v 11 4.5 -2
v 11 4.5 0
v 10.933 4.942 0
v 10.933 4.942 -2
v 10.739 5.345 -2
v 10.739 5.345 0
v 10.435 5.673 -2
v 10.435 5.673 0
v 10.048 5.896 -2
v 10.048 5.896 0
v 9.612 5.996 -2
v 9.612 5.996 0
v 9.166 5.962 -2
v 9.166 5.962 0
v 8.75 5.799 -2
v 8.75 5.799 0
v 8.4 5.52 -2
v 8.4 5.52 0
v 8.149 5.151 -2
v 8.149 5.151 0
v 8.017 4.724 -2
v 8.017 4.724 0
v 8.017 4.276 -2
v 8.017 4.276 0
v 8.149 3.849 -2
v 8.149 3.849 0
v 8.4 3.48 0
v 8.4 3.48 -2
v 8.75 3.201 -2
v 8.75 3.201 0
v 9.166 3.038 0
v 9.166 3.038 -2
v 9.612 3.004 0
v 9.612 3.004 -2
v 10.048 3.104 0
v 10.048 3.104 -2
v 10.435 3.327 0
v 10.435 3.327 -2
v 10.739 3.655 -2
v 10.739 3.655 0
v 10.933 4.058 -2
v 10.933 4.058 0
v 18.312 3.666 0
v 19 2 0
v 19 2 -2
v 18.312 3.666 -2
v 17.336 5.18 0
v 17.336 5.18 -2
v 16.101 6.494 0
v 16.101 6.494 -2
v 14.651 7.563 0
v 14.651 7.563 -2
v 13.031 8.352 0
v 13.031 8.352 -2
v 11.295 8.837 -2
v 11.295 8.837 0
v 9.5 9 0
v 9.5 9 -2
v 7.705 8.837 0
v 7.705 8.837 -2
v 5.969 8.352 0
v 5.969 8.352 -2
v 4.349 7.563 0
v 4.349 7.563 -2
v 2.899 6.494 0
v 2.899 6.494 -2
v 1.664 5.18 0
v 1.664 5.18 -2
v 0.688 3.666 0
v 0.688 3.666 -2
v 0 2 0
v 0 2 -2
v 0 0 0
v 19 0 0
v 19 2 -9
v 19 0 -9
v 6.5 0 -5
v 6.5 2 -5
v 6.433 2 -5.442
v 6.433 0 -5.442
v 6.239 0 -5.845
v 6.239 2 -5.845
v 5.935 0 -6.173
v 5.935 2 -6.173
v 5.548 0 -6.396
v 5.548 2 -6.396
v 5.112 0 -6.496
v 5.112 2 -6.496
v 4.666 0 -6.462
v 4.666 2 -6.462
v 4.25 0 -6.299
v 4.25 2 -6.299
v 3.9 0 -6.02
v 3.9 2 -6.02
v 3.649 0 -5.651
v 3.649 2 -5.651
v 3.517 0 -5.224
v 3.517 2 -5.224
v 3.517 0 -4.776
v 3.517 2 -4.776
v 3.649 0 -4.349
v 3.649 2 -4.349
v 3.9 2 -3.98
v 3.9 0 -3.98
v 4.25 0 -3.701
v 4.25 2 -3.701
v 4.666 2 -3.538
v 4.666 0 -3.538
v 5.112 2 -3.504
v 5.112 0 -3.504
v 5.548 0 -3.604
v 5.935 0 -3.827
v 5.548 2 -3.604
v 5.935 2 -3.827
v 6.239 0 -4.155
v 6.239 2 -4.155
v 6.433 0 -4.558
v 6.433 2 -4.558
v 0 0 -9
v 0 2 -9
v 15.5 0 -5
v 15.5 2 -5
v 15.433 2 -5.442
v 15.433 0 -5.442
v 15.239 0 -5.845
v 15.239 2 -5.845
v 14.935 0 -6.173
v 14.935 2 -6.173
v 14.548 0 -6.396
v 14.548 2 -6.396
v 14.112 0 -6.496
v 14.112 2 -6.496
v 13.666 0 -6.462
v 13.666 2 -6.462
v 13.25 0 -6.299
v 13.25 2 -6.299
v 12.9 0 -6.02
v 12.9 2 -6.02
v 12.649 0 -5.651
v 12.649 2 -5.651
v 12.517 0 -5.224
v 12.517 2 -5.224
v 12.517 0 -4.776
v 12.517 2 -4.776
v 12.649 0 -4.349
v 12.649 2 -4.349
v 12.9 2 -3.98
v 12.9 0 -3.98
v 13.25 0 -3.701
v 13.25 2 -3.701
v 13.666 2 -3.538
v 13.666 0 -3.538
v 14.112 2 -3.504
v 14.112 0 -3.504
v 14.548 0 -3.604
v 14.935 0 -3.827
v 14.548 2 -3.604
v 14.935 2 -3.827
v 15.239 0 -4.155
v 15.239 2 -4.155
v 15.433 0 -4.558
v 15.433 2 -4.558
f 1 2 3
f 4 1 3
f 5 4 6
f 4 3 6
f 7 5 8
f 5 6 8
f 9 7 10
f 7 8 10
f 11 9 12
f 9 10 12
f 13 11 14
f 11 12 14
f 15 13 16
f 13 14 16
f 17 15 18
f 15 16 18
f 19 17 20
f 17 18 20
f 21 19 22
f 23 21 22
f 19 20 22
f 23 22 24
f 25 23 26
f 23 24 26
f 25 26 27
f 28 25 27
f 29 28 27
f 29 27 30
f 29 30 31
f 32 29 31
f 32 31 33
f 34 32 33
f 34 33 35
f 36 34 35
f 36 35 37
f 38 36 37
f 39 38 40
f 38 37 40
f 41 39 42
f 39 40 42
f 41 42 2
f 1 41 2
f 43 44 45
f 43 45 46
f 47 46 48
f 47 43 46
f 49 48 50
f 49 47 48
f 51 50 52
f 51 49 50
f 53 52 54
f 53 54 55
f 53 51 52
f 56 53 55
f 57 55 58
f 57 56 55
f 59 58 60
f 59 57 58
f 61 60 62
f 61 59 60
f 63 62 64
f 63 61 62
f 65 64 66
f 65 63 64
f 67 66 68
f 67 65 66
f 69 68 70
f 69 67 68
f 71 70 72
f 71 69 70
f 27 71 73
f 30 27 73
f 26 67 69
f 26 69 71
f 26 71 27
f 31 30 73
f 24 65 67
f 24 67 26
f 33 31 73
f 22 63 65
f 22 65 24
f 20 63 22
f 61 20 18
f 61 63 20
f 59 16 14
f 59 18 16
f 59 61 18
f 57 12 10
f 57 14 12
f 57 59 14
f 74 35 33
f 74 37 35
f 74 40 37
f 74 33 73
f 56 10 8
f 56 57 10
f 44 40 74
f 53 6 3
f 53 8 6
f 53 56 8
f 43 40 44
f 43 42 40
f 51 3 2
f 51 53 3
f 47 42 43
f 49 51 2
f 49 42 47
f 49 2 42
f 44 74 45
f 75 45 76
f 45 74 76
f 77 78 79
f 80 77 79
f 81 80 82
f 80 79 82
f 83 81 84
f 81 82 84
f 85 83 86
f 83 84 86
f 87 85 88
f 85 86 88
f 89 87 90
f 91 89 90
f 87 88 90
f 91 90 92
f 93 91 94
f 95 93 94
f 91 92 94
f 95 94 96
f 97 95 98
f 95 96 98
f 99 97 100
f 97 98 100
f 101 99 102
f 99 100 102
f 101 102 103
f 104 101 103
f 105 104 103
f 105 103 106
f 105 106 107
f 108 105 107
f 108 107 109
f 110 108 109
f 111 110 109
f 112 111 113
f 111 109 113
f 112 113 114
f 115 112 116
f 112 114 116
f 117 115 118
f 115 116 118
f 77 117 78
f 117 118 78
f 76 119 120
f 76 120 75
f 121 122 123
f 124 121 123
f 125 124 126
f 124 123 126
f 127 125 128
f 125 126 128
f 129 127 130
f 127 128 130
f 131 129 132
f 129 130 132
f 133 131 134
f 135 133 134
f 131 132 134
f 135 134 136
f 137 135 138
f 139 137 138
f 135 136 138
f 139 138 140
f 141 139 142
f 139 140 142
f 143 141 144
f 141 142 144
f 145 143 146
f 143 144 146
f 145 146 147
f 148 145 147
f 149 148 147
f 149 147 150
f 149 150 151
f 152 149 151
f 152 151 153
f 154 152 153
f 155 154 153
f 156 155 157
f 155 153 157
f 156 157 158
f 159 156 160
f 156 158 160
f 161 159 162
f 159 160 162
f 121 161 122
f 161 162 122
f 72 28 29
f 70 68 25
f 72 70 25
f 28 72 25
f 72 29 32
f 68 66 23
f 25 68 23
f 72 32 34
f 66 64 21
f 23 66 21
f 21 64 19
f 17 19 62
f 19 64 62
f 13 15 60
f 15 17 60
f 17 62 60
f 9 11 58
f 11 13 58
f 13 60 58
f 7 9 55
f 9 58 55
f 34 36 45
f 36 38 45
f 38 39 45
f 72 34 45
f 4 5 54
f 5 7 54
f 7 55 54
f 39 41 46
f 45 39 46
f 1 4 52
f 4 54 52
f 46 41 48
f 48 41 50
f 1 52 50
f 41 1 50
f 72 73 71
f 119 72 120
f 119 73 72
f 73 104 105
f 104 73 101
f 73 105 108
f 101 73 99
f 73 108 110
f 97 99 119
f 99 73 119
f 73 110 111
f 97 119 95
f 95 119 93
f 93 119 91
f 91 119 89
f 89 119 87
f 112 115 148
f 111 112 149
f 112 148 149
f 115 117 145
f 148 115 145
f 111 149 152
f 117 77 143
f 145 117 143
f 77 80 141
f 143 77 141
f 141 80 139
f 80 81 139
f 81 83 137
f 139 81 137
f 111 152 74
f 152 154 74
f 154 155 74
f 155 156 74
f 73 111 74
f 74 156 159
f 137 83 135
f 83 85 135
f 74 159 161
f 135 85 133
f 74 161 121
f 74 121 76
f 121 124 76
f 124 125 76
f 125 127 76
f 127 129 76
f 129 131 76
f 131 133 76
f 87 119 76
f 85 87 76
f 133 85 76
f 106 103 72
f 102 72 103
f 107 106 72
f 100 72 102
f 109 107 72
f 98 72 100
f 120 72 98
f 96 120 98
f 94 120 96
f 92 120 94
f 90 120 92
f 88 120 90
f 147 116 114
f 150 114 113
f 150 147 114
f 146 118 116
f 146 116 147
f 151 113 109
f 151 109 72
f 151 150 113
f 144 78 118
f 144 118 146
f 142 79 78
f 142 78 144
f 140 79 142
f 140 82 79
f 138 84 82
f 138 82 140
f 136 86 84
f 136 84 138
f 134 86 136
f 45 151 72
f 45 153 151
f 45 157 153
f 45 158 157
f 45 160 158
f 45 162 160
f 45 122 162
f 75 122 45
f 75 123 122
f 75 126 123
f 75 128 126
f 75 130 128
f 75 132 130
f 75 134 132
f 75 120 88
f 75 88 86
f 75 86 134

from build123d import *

# Parameters (mm, degrees)
SKETCH1_W           = 19
SKETCH1_H           = 9
BOSS_EXTRUDE1_DEPTH = 2
BOSS_EXTRUDE2_DEPTH = 2
SKETCH4_R           = 1.5
CUT_EXTRUDE1_DEPTH  = 2
SKETCH5_R           = 1.5
CUT_EXTRUDE2_DEPTH  = 2


with BuildPart() as part:
    # Sketch1 → Boss-Extrude1 (new body)
    with BuildSketch(Plane(origin=(0, 0, 0), x_dir=(1, 0, 0), z_dir=(0, 1, 0))):
        with Locations((9.5, 4.5)):
            Rectangle(SKETCH1_W, SKETCH1_H)
    extrude(amount=BOSS_EXTRUDE1_DEPTH)

    # Sketch3 → Boss-Extrude2 (add)
    with BuildSketch(Plane.XY):
        with BuildLine():
            Line((0, 2), (19, 2))
            ThreePointArc((19, 2), (9.5, 9), (0, 2))
        make_face()
    extrude(amount=-BOSS_EXTRUDE2_DEPTH)

    # Sketch4 → Cut-Extrude1 (cut)
    with BuildSketch(Plane(origin=(0, 2, 0), x_dir=(1, 0, 0), z_dir=(0, 1, 0))):
        with Locations((5, 5)):
            Circle(SKETCH4_R)
        with Locations((14, 5)):
            Circle(SKETCH4_R)
    extrude(amount=-CUT_EXTRUDE1_DEPTH, mode=Mode.SUBTRACT)

    # Sketch5 → Cut-Extrude2 (cut)
    with BuildSketch(Plane.XY):
        with Locations((9.5, 4.5)):
            Circle(SKETCH5_R)
    extrude(amount=-CUT_EXTRUDE2_DEPTH, mode=Mode.SUBTRACT)


solid = part.part
